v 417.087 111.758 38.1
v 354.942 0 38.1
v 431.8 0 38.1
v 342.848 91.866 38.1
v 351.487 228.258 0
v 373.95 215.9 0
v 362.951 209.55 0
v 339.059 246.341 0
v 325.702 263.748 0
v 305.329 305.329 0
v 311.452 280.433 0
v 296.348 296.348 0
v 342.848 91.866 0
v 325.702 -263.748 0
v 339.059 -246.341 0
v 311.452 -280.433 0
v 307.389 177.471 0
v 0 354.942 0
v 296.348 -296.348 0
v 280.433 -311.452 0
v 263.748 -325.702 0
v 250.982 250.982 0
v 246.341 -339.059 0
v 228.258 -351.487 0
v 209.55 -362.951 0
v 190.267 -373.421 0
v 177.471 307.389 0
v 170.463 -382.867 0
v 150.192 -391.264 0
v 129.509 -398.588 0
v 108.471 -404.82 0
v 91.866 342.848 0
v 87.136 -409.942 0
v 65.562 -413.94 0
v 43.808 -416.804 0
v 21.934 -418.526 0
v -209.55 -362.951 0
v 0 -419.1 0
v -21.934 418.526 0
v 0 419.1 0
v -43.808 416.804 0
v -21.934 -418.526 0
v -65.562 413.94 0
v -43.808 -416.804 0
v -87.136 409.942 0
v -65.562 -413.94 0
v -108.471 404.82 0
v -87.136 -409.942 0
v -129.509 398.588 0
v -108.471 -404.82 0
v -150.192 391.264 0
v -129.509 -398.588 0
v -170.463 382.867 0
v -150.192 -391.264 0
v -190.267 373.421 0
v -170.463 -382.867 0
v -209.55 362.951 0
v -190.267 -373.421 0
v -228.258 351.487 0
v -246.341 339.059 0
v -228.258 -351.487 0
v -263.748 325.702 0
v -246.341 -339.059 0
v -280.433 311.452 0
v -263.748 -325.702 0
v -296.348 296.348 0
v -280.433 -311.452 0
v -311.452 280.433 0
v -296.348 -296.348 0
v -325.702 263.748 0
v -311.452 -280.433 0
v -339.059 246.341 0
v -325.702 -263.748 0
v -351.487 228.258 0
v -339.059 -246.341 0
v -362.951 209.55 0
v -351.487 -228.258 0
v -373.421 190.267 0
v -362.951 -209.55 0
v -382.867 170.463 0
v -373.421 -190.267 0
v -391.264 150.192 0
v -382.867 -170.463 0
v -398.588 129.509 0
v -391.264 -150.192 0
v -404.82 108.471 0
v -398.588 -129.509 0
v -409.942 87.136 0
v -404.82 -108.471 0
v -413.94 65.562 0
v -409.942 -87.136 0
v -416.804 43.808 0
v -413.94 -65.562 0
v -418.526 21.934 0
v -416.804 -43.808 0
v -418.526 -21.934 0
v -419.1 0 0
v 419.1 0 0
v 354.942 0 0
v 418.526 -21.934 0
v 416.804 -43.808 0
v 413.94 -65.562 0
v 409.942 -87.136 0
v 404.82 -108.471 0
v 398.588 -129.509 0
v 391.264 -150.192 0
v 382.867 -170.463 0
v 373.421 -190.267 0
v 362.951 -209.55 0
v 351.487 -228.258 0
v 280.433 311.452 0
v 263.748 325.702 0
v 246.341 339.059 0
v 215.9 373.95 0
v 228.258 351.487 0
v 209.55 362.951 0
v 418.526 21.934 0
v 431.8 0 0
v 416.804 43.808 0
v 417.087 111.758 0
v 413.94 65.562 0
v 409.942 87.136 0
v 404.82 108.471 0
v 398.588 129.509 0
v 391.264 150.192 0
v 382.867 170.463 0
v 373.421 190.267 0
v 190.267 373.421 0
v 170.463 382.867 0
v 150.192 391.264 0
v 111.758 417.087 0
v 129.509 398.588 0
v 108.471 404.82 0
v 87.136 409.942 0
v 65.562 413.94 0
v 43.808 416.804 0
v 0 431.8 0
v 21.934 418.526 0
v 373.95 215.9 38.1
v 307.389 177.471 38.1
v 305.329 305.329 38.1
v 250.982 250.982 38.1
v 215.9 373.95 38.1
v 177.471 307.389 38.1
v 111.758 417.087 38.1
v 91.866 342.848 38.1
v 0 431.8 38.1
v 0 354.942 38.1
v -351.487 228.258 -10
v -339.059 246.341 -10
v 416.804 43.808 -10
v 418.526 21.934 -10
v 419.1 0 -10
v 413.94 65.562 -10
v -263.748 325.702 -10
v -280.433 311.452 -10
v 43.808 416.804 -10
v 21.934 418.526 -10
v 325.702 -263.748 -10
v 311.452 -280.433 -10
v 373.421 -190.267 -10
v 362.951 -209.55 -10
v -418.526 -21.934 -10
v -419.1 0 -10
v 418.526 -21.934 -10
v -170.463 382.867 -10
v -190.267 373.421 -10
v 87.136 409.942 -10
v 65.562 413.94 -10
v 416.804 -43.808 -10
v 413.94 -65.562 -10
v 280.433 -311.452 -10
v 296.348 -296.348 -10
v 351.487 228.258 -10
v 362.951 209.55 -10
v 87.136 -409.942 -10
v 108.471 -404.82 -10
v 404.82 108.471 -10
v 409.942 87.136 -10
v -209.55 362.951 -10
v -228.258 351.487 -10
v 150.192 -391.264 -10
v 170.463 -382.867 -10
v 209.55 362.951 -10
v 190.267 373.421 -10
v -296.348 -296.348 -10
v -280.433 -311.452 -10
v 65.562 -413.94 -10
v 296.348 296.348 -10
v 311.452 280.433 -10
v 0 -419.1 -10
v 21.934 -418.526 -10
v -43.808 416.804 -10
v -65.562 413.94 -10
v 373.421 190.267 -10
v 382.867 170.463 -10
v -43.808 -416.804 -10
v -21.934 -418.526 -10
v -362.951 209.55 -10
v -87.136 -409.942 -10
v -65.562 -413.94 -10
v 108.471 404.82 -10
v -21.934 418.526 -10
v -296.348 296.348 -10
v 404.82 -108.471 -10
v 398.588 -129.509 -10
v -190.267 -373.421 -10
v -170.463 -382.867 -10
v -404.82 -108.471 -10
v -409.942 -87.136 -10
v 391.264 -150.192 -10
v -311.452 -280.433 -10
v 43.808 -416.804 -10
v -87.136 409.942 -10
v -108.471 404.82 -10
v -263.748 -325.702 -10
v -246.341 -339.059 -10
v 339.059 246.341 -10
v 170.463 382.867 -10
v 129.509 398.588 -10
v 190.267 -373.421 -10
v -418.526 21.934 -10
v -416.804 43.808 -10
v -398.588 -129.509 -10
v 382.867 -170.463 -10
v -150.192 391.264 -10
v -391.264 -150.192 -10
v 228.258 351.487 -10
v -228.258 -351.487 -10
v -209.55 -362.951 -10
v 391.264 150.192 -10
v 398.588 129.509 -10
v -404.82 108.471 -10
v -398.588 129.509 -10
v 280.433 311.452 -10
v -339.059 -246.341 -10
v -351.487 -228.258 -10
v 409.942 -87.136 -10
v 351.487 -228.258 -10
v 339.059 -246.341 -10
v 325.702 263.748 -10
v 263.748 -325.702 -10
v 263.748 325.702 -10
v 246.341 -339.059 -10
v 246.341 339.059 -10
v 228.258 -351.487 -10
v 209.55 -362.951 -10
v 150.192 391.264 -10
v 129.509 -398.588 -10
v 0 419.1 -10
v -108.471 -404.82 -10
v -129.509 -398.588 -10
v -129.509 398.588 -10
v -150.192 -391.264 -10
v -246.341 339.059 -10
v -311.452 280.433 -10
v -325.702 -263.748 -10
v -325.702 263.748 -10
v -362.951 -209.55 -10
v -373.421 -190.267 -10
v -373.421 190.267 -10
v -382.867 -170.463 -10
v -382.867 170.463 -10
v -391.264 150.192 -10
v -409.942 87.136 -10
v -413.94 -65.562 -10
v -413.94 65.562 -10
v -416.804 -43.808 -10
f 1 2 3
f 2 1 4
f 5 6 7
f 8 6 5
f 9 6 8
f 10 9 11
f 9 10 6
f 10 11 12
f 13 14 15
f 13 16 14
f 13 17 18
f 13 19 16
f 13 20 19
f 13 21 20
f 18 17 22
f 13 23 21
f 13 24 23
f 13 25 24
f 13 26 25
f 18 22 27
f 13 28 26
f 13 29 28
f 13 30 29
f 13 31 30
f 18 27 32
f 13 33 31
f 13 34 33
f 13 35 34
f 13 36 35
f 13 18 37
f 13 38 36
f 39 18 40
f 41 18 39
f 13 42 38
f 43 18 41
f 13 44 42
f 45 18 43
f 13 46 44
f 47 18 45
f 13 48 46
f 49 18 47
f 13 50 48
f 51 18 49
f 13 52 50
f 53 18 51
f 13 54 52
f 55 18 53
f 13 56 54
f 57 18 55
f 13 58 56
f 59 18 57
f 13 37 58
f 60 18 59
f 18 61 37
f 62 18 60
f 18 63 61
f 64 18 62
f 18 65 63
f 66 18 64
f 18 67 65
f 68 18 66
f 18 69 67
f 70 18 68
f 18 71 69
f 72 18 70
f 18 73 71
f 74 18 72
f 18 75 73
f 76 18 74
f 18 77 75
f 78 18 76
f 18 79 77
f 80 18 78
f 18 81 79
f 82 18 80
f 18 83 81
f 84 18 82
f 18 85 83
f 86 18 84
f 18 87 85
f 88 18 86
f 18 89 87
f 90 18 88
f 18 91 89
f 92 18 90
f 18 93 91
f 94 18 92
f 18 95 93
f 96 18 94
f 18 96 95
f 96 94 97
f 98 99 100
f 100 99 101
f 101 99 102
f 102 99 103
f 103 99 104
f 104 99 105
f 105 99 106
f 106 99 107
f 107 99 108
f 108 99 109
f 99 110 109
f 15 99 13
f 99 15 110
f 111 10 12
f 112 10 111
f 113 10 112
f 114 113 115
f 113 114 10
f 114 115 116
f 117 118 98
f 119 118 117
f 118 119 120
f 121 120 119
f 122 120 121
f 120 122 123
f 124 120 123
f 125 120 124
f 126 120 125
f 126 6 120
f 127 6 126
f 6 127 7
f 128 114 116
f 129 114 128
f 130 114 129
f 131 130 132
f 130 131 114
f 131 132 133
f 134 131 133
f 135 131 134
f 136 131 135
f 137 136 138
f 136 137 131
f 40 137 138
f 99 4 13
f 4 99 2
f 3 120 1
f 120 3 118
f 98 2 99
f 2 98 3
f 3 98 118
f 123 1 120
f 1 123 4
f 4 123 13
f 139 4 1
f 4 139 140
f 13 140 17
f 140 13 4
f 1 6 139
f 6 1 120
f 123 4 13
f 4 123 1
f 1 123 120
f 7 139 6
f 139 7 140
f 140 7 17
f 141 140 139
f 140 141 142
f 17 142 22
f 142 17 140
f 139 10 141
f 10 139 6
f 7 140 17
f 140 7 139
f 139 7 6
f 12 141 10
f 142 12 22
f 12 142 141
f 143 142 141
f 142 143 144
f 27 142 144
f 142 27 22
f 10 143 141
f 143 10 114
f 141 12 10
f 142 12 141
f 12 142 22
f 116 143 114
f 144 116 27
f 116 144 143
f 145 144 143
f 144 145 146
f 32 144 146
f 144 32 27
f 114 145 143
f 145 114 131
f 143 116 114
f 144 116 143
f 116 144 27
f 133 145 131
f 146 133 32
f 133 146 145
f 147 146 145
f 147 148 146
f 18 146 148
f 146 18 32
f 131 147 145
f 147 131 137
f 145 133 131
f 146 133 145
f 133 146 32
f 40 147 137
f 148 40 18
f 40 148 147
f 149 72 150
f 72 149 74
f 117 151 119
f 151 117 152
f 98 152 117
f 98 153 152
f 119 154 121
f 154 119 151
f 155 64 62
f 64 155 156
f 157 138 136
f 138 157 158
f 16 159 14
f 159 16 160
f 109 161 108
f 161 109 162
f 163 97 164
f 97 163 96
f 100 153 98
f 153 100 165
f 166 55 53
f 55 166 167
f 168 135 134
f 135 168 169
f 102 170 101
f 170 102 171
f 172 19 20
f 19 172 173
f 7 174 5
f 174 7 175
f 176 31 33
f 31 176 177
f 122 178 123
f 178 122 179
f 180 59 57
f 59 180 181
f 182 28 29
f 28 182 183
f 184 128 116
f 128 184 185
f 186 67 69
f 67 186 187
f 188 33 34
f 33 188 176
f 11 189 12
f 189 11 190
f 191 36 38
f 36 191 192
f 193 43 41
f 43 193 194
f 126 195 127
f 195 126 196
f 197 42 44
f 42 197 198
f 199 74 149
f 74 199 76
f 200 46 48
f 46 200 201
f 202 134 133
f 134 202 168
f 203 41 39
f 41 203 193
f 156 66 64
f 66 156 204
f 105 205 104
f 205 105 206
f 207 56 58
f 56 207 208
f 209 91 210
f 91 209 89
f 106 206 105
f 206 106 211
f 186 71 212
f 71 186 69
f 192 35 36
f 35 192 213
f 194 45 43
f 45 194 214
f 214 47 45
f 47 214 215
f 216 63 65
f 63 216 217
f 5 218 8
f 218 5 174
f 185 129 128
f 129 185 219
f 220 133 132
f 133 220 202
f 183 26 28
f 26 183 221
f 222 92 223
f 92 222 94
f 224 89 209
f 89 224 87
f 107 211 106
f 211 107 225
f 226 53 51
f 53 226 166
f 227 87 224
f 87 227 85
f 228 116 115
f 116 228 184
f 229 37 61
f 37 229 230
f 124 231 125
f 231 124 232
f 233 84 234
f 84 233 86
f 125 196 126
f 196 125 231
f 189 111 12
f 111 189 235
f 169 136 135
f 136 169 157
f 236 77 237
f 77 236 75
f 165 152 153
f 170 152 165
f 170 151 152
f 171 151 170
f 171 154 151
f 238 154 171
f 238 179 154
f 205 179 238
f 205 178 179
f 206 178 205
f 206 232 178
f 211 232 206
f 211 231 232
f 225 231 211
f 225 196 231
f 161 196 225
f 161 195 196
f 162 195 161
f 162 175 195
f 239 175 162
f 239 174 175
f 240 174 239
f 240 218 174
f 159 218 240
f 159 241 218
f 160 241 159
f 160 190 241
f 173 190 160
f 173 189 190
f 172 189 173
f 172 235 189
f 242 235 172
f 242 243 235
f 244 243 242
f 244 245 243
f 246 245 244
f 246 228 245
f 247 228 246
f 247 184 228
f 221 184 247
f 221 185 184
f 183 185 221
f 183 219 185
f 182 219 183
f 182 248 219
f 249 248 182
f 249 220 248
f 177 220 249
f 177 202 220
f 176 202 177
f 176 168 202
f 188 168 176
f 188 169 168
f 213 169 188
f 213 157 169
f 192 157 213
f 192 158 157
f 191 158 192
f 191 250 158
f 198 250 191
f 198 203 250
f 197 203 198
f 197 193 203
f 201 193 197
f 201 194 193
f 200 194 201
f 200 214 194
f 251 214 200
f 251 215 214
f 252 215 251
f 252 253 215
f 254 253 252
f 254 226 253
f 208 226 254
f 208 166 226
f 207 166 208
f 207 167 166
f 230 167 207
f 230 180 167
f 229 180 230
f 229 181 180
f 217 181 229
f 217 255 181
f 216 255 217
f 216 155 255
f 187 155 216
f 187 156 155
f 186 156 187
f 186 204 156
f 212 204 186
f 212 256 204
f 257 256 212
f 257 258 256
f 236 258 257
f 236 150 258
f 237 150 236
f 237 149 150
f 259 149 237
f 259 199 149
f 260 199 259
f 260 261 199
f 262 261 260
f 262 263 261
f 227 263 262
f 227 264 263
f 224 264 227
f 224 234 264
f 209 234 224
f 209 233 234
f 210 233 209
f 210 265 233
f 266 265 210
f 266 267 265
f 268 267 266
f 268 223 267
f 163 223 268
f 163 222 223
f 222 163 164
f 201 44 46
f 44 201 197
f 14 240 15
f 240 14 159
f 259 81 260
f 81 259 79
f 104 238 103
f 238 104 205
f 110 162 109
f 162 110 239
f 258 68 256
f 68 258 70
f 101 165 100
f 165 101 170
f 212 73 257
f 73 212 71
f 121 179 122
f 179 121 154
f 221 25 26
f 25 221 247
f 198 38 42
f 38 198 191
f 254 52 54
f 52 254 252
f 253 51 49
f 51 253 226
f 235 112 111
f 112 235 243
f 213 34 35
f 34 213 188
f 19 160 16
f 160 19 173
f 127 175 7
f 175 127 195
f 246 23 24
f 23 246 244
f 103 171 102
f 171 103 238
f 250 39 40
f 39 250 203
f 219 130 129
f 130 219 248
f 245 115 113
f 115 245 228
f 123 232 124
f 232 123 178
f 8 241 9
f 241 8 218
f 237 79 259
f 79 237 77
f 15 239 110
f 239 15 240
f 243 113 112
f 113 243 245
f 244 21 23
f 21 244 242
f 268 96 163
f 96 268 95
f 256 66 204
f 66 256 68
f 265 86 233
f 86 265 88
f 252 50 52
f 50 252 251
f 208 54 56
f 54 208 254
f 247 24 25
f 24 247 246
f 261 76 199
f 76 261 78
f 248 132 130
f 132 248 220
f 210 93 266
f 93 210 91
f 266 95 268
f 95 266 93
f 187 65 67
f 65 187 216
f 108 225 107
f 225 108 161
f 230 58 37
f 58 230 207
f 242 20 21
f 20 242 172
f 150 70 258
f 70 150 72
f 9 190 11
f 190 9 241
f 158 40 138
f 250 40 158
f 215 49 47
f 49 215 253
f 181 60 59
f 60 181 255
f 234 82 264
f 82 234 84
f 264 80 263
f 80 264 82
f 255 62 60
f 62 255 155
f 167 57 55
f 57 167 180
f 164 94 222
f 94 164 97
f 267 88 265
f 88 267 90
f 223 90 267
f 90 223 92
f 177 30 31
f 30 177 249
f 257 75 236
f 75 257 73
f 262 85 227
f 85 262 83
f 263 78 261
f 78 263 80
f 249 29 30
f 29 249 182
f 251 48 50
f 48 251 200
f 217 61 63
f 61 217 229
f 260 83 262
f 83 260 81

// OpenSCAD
union() {
	color(alpha = 1.0000000000, c = [0.4000000000, 0.3000000000, 0.9000000000]) {
		translate(v = [0, 0, -10]) {
			cylinder($fn = 120, h = 10, r = 419.1000000000);
		}
	}
	translate(v = [431.8000000000, 0.0000000000, 0]) {
		rotate(a = 97.5000000000, v = [0, 0, 1]) {
			difference() {
				cube(size = [112.7224196012, 76.2000000000, 38.1000000000]);
				translate(v = [0, 0, 0]) {
					rotate(a = -7.5000000000, v = [0, 0, 1]) {
						translate(v = [-20, -1, -1]) {
							cube(size = [20, 78.2000000000, 40.1000000000]);
						}
					}
				}
				translate(v = [112.7224196012, 0, 0]) {
					rotate(a = 7.5000000000, v = [0, 0, 1]) {
						translate(v = [0, -1, -1]) {
							cube(size = [20, 78.2000000000, 40.1000000000]);
						}
					}
				}
			}
		}
	}
	translate(v = [417.0867717916, 111.7580636753, 0]) {
		rotate(a = 112.5000000000, v = [0, 0, 1]) {
			difference() {
				cube(size = [112.7224196012, 76.2000000000, 38.1000000000]);
				translate(v = [0, 0, 0]) {
					rotate(a = -7.5000000000, v = [0, 0, 1]) {
						translate(v = [-20, -1, -1]) {
							cube(size = [20, 78.2000000000, 40.1000000000]);
						}
					}
				}
				translate(v = [112.7224196012, 0, 0]) {
					rotate(a = 7.5000000000, v = [0, 0, 1]) {
						translate(v = [0, -1, -1]) {
							cube(size = [20, 78.2000000000, 40.1000000000]);
						}
					}
				}
			}
		}
	}
	translate(v = [373.9497693541, 215.9000000000, 0]) {
		rotate(a = 127.5000000000, v = [0, 0, 1]) {
			difference() {
				cube(size = [112.7224196012, 76.2000000000, 38.1000000000]);
				translate(v = [0, 0, 0]) {
					rotate(a = -7.5000000000, v = [0, 0, 1]) {
						translate(v = [-20, -1, -1]) {
							cube(size = [20, 78.2000000000, 40.1000000000]);
						}
					}
				}
				translate(v = [112.7224196012, 0, 0]) {
					rotate(a = 7.5000000000, v = [0, 0, 1]) {
						translate(v = [0, -1, -1]) {
							cube(size = [20, 78.2000000000, 40.1000000000]);
						}
					}
				}
			}
		}
	}
	translate(v = [305.3287081164, 305.3287081164, 0]) {
		rotate(a = 142.5000000000, v = [0, 0, 1]) {
			difference() {
				cube(size = [112.7224196012, 76.2000000000, 38.1000000000]);
				translate(v = [0, 0, 0]) {
					rotate(a = -7.5000000000, v = [0, 0, 1]) {
						translate(v = [-20, -1, -1]) {
							cube(size = [20, 78.2000000000, 40.1000000000]);
						}
					}
				}
				translate(v = [112.7224196012, 0, 0]) {
					rotate(a = 7.5000000000, v = [0, 0, 1]) {
						translate(v = [0, -1, -1]) {
							cube(size = [20, 78.2000000000, 40.1000000000]);
						}
					}
				}
			}
		}
	}
	translate(v = [215.9000000000, 373.9497693541, 0]) {
		rotate(a = 157.5000000000, v = [0, 0, 1]) {
			difference() {
				cube(size = [112.7224196012, 76.2000000000, 38.1000000000]);
				translate(v = [0, 0, 0]) {
					rotate(a = -7.5000000000, v = [0, 0, 1]) {
						translate(v = [-20, -1, -1]) {
							cube(size = [20, 78.2000000000, 40.1000000000]);
						}
					}
				}
				translate(v = [112.7224196012, 0, 0]) {
					rotate(a = 7.5000000000, v = [0, 0, 1]) {
						translate(v = [0, -1, -1]) {
							cube(size = [20, 78.2000000000, 40.1000000000]);
						}
					}
				}
			}
		}
	}
	translate(v = [111.7580636753, 417.0867717916, 0]) {
		rotate(a = 172.5000000000, v = [0, 0, 1]) {
			difference() {
				cube(size = [112.7224196012, 76.2000000000, 38.1000000000]);
				translate(v = [0, 0, 0]) {
					rotate(a = -7.5000000000, v = [0, 0, 1]) {
						translate(v = [-20, -1, -1]) {
							cube(size = [20, 78.2000000000, 40.1000000000]);
						}
					}
				}
				translate(v = [112.7224196012, 0, 0]) {
					rotate(a = 7.5000000000, v = [0, 0, 1]) {
						translate(v = [0, -1, -1]) {
							cube(size = [20, 78.2000000000, 40.1000000000]);
						}
					}
				}
			}
		}
	}
}
